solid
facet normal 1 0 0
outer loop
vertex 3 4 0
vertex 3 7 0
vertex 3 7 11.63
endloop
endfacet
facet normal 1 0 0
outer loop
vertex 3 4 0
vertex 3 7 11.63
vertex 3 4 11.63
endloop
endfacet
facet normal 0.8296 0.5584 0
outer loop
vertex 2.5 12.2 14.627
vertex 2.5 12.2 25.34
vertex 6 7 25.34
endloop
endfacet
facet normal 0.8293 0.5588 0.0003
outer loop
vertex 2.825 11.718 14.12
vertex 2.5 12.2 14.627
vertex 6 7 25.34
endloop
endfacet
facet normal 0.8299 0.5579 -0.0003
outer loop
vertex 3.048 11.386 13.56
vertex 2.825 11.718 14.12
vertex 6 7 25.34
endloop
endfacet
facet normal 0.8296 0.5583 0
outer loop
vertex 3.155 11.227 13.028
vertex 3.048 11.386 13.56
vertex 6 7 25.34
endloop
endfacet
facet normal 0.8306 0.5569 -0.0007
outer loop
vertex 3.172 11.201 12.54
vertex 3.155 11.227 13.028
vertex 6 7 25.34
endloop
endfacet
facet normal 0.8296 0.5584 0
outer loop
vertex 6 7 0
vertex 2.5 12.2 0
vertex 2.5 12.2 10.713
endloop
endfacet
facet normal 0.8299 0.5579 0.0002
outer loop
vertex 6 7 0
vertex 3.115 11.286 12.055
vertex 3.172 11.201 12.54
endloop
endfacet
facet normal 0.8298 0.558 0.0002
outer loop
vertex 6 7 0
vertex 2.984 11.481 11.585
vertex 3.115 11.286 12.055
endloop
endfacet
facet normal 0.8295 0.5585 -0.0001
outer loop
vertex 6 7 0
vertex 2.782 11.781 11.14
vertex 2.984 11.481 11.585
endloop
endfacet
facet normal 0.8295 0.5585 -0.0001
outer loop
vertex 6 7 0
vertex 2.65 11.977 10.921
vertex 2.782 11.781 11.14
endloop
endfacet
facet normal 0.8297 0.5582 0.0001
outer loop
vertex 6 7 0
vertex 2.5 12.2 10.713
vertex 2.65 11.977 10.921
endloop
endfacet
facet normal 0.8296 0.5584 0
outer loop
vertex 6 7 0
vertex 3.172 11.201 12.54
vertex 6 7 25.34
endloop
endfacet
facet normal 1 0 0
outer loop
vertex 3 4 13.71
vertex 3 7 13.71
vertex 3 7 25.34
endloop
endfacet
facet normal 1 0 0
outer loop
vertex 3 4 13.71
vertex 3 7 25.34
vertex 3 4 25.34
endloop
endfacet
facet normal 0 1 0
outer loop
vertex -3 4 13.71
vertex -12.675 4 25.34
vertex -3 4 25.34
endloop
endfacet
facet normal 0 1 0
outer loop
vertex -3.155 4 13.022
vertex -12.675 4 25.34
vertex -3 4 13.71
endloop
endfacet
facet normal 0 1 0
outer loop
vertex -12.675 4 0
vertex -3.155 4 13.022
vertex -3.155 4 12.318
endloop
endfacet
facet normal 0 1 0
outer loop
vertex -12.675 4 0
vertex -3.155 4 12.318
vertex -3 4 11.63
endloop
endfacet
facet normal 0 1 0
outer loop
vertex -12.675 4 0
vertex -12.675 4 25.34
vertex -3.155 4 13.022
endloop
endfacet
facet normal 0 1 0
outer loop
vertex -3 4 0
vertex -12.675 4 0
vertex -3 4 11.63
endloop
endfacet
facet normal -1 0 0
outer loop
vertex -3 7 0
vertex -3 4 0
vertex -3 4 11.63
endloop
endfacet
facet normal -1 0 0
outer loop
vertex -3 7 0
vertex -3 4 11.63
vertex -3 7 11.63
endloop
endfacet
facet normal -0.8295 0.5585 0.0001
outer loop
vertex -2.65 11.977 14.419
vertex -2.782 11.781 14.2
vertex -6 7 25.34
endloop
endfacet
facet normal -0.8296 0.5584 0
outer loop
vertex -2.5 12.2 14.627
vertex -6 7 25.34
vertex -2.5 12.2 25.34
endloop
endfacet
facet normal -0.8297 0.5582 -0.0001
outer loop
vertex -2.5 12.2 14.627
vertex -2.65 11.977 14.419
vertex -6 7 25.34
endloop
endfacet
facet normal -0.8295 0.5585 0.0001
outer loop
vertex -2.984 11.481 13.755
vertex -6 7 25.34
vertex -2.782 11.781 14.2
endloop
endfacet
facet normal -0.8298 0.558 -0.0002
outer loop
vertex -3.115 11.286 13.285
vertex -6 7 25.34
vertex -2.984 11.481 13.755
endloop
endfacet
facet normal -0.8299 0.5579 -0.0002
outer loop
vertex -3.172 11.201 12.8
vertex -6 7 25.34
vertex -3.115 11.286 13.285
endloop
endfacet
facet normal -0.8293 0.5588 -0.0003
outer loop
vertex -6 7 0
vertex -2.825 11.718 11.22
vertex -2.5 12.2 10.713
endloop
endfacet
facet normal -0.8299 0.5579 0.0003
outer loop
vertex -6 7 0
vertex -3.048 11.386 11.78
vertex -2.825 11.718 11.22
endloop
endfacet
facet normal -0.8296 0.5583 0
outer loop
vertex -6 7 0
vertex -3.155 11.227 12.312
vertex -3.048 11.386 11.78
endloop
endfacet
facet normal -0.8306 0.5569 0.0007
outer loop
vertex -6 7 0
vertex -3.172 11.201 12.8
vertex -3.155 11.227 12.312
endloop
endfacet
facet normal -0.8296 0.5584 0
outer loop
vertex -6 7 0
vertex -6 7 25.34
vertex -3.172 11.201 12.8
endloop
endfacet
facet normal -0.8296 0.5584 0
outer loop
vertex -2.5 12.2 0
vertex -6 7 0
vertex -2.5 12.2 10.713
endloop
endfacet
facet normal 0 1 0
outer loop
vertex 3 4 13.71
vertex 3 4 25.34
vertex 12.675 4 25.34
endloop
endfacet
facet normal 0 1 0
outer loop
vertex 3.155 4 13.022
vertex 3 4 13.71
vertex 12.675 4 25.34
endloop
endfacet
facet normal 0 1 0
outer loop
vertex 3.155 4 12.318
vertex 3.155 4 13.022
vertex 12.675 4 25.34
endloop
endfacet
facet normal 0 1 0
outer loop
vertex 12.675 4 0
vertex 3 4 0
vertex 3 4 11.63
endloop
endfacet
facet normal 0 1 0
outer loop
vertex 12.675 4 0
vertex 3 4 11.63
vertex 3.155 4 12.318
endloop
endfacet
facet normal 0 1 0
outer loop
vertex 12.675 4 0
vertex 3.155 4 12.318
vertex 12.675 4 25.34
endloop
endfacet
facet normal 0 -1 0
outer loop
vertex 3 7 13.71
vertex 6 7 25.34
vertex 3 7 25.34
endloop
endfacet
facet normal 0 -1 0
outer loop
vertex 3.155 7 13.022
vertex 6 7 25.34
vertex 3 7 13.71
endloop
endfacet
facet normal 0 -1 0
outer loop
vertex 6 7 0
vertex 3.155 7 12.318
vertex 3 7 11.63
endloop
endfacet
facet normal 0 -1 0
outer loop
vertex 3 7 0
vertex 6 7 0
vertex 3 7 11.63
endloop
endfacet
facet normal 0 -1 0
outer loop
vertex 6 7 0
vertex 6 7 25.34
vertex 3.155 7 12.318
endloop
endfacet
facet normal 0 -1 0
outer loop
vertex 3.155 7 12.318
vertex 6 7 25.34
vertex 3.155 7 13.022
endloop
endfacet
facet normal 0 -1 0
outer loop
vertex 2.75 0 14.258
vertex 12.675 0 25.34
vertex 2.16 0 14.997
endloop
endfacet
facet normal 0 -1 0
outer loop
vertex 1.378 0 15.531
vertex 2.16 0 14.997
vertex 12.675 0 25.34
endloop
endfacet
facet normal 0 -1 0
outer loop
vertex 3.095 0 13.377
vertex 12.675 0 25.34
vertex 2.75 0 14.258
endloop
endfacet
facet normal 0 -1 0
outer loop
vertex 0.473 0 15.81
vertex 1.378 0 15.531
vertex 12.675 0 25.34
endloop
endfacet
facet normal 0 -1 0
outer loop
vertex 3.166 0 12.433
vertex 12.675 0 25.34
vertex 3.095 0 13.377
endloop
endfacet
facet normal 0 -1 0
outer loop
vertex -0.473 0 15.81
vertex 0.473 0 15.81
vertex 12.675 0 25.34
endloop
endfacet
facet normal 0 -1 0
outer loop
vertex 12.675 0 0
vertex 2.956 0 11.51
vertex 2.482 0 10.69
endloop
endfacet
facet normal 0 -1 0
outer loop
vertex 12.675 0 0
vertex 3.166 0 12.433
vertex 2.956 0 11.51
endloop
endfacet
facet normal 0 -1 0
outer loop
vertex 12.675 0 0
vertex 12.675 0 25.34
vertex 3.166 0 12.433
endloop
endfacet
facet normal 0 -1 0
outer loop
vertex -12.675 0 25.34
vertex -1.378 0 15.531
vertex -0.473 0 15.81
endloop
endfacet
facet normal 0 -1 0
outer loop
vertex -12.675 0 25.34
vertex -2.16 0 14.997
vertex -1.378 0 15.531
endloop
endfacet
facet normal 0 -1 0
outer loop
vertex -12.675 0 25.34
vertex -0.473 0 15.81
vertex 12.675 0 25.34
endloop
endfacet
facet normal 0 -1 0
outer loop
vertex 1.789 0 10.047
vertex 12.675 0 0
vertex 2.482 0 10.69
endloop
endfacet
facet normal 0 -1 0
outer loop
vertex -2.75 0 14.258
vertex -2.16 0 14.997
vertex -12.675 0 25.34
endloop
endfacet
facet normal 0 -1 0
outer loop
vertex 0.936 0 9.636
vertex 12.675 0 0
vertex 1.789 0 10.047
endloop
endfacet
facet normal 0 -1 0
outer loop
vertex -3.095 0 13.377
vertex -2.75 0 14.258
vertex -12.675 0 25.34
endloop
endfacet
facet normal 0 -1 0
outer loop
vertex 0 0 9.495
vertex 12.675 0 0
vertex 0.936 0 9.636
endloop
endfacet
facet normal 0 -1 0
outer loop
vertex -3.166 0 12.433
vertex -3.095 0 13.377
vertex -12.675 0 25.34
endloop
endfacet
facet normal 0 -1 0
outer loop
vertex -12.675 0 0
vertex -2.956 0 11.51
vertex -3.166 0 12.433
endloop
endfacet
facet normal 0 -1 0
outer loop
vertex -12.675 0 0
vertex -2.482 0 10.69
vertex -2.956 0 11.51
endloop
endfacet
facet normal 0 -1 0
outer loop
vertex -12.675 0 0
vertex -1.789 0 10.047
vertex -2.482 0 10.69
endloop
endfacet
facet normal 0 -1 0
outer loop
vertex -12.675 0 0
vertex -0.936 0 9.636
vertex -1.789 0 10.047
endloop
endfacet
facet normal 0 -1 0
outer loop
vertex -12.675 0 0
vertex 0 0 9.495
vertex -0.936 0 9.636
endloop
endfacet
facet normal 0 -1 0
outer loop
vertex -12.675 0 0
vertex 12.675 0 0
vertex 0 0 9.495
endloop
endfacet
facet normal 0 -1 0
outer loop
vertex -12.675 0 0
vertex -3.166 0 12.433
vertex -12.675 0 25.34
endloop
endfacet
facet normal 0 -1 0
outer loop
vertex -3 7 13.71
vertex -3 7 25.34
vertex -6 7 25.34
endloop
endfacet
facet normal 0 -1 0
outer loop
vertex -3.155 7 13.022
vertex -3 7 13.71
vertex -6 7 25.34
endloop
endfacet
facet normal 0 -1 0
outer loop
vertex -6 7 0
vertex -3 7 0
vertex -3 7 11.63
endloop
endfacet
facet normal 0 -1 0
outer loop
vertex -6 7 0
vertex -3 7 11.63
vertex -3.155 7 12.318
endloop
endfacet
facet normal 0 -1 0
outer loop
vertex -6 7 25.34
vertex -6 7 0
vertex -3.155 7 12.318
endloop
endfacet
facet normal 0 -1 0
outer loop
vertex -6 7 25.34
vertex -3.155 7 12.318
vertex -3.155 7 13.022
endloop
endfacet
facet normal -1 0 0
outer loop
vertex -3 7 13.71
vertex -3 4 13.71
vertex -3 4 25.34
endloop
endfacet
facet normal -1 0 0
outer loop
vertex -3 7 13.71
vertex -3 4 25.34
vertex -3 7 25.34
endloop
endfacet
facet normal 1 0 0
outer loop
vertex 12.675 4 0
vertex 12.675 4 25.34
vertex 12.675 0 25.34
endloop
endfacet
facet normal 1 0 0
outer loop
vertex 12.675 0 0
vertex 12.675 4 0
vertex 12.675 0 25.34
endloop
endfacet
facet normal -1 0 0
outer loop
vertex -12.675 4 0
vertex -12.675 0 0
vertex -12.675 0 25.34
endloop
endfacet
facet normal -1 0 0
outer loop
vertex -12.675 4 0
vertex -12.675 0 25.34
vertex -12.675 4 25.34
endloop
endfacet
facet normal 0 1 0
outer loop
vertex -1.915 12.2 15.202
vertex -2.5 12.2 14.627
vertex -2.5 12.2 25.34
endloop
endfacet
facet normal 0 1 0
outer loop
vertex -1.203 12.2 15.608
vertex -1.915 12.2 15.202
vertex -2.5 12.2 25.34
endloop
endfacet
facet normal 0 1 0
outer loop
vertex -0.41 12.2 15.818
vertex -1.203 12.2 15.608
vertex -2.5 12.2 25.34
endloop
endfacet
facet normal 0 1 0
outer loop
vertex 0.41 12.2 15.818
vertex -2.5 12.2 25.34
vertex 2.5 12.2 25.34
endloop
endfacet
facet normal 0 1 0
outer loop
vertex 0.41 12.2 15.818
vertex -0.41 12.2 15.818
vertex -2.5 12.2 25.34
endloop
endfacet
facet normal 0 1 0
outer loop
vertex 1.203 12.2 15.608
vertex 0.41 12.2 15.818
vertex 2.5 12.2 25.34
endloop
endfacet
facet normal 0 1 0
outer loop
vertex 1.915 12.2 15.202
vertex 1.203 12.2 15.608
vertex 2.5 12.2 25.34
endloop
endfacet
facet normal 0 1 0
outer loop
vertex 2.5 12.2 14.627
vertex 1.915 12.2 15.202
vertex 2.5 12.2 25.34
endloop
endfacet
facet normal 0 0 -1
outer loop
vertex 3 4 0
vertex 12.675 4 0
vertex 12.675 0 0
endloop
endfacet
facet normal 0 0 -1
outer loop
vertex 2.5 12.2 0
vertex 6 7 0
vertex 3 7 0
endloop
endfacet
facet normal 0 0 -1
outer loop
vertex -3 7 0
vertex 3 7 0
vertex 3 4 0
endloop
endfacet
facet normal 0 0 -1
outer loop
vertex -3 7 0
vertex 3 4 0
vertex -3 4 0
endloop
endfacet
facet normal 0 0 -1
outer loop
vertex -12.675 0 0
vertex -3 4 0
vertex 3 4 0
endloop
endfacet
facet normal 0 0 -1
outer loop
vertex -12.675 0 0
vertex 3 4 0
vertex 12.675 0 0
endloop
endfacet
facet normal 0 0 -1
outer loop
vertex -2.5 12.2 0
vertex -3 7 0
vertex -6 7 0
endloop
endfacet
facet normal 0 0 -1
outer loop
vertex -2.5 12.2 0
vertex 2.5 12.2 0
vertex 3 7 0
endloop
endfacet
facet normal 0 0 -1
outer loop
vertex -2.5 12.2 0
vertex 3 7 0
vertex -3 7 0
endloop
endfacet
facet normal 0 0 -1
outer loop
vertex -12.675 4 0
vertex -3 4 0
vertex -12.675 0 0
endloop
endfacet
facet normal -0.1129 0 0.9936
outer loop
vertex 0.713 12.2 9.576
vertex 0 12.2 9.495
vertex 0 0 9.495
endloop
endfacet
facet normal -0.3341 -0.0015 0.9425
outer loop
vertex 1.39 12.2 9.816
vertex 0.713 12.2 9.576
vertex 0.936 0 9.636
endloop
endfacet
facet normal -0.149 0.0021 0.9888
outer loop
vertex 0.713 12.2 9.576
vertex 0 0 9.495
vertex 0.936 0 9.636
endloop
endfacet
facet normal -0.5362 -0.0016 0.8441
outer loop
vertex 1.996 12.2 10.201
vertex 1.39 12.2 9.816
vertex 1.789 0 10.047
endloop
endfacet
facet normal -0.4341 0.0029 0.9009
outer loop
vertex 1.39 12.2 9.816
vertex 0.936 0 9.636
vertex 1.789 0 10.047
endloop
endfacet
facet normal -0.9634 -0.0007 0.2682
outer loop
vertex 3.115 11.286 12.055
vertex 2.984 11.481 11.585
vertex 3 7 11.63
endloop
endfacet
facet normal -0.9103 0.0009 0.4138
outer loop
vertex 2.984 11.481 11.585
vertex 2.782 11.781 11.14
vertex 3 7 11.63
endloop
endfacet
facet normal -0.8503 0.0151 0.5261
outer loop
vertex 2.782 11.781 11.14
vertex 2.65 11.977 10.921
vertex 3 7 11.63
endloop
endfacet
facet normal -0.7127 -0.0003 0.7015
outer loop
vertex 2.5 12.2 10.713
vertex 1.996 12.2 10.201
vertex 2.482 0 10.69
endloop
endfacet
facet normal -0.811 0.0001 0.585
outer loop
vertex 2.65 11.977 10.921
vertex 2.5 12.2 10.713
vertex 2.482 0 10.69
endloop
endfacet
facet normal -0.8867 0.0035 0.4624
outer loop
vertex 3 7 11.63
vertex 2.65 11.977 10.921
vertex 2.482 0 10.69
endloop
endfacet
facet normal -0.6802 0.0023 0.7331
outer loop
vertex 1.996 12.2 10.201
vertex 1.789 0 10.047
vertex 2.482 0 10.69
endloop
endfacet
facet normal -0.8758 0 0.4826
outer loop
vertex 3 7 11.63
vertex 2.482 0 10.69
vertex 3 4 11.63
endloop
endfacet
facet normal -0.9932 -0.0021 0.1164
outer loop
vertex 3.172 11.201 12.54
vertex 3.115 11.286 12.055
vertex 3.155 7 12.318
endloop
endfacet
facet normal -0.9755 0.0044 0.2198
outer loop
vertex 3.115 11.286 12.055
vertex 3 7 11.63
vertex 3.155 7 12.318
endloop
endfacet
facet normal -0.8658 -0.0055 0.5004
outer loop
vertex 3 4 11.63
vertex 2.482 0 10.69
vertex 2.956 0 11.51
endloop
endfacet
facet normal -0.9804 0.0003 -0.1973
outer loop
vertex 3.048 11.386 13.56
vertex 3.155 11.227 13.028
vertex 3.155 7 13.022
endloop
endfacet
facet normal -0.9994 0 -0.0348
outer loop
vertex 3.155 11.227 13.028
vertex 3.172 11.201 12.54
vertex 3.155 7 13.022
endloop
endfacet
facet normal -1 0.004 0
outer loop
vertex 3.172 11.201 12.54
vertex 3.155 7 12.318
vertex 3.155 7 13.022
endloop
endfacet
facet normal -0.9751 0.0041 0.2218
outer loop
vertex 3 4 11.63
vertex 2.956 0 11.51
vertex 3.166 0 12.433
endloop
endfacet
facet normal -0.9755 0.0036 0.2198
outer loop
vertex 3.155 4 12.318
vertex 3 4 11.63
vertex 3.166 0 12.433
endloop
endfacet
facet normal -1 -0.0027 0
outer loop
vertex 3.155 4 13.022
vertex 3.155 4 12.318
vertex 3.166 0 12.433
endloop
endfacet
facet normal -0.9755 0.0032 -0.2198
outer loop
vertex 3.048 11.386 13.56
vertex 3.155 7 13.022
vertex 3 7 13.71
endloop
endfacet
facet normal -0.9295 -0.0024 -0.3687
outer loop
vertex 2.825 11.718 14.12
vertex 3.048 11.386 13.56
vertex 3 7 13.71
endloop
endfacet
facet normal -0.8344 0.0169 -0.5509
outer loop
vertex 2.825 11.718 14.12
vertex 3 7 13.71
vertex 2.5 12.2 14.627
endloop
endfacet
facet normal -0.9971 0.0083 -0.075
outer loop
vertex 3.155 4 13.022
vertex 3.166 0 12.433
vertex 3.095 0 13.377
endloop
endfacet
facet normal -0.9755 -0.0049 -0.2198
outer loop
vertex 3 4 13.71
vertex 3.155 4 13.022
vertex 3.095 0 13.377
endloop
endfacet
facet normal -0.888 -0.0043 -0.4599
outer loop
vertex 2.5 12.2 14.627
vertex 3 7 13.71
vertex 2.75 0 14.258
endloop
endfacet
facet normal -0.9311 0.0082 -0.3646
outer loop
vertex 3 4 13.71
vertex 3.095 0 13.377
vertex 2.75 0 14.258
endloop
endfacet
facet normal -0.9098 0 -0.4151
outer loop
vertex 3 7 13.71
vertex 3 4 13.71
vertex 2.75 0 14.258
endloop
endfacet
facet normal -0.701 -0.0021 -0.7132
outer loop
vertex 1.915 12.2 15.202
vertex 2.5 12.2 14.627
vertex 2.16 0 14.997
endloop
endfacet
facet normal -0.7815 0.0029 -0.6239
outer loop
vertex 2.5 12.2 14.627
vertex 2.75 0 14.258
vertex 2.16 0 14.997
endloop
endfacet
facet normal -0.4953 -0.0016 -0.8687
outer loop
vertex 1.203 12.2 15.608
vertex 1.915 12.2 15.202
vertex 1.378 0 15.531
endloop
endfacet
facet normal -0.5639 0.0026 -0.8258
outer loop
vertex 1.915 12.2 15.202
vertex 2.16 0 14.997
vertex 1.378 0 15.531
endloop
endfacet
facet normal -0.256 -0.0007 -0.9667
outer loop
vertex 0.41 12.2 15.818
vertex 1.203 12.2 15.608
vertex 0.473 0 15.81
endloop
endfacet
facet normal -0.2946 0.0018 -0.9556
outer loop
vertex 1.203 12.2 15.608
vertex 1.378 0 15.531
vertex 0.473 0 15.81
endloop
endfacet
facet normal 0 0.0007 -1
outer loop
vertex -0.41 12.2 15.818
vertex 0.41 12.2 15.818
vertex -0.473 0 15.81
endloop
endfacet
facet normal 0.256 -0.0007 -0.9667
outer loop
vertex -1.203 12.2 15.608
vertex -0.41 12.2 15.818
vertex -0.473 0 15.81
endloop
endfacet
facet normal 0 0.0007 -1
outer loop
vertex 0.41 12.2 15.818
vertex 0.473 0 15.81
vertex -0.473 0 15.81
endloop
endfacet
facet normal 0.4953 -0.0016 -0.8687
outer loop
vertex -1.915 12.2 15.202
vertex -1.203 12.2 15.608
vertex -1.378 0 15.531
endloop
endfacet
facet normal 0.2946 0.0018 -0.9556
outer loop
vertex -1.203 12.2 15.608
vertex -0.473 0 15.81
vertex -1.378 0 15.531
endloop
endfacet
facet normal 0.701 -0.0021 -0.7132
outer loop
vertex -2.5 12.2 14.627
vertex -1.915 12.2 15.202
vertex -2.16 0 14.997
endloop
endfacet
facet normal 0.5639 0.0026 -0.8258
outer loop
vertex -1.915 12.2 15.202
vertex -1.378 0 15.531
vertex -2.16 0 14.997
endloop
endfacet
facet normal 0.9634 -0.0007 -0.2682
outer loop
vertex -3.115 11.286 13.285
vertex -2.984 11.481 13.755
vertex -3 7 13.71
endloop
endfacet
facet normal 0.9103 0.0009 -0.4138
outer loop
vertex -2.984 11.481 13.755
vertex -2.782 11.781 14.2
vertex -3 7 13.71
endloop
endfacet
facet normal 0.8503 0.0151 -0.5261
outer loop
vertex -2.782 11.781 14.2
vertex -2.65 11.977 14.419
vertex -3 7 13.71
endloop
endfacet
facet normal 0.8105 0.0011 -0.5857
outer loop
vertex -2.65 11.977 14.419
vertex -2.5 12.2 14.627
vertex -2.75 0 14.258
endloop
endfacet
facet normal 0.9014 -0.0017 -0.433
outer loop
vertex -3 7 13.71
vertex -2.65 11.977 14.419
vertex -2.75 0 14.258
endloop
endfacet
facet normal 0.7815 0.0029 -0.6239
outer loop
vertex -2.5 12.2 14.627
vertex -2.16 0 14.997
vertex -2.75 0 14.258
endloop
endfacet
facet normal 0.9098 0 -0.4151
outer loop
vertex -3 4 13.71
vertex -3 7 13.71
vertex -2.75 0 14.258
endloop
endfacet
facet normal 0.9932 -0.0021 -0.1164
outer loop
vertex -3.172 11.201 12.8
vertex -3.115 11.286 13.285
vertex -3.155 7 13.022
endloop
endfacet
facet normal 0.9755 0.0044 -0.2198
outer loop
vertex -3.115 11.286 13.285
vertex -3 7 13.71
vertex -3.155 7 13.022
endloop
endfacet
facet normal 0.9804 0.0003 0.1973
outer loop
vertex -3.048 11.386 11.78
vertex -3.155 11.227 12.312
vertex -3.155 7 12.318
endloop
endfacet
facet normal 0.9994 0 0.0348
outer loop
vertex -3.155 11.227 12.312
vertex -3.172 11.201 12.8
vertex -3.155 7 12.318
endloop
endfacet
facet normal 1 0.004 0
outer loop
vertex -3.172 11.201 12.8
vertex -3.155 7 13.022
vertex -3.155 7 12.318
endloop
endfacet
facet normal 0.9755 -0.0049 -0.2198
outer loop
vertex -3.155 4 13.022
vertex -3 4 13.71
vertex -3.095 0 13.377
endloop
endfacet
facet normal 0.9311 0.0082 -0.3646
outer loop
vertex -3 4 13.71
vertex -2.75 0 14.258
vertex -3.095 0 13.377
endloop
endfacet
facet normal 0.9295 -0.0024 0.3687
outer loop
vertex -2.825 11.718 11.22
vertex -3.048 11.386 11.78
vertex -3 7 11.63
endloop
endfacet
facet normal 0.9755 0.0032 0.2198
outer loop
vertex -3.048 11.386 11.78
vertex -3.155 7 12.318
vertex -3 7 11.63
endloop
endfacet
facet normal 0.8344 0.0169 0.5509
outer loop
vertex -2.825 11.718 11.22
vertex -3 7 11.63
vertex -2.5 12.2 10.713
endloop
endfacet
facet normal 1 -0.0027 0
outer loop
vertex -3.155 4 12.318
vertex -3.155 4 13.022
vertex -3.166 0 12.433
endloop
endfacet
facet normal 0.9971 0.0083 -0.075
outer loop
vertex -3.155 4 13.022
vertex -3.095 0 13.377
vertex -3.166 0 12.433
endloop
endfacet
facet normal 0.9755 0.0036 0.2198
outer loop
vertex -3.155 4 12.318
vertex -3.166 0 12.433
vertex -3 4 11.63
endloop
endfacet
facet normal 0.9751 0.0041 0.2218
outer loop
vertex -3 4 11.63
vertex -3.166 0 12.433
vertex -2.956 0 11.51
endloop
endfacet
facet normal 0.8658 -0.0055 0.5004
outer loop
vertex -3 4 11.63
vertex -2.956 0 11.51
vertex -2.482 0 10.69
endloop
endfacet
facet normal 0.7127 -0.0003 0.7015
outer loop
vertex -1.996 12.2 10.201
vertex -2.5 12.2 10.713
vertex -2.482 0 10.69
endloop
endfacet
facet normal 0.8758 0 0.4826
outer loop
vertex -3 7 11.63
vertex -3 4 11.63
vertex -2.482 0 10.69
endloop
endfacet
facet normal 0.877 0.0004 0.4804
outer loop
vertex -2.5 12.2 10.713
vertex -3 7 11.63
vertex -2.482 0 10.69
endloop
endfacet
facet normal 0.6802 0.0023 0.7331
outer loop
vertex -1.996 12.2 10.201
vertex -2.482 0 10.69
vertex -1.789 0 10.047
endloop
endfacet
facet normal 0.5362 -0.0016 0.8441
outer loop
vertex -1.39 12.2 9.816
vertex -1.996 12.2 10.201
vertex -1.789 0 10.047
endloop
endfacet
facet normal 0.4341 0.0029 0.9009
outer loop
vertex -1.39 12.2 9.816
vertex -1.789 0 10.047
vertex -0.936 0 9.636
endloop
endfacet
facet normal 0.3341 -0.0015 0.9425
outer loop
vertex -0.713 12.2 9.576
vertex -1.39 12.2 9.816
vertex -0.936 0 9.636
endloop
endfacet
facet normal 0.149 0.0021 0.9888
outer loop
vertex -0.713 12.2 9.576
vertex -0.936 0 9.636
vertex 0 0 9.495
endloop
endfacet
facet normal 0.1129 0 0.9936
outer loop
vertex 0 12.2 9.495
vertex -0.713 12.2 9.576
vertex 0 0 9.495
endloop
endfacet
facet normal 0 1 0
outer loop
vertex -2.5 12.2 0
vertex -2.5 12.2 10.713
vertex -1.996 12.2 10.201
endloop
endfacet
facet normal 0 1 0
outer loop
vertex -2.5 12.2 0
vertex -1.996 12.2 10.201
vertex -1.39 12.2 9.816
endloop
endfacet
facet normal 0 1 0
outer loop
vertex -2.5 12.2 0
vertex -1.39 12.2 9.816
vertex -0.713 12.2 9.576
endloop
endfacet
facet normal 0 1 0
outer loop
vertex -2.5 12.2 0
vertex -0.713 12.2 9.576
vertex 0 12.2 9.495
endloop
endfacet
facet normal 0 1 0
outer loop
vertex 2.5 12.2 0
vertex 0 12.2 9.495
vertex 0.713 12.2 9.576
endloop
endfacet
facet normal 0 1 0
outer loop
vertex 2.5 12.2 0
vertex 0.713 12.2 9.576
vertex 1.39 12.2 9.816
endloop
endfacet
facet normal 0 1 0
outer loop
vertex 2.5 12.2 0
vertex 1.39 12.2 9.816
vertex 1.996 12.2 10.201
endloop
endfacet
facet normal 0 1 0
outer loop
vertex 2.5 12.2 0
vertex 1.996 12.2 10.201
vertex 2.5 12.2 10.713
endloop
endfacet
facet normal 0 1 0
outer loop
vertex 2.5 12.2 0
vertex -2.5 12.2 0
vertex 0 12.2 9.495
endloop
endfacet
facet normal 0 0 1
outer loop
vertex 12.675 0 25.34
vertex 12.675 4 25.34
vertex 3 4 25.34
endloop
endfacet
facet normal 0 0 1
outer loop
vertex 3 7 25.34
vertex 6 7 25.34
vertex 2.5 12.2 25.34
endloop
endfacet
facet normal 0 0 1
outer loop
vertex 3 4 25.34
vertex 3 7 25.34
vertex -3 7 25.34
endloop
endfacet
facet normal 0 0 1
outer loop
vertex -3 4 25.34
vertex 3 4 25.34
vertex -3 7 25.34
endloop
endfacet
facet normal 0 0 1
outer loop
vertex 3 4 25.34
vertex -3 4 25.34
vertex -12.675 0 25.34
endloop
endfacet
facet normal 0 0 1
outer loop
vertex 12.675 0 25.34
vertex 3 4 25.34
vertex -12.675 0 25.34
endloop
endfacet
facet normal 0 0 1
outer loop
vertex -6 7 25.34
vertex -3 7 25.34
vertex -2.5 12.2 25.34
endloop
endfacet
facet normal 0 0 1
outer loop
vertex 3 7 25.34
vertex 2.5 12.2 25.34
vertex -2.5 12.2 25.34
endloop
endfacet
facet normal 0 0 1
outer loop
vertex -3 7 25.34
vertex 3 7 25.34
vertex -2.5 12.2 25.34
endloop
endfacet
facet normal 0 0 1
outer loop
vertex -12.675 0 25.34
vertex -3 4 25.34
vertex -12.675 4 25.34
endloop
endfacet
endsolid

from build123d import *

# Parameters (mm, degrees)
BOSS_EXTRUDE1_DEPTH = 25.34
SKETCH2_R           = 3.175
CUT_EXTRUDE1_DEPTH  = 31.848196463


with BuildPart() as part:
    # Sketch1 → Boss-Extrude1 (new body)
    with BuildSketch(Plane.XY):
        Polygon((12.675, 0), (-12.675, 0), (-12.675, 4), (-3, 4), (-3, 7), (-6, 7), (-2.5, 12.2), (2.5, 12.2), (6, 7), (3, 7), (3, 4), (12.675, 4), align=None)
    extrude(amount=BOSS_EXTRUDE1_DEPTH)

    # Sketch2 → Cut-Extrude1 (cut, through all)
    with BuildSketch(Plane.XZ):
        with Locations(Location((0, 12.67, 0), (0, 0, 270))):
            Circle(SKETCH2_R)
    extrude(amount=-CUT_EXTRUDE1_DEPTH, mode=Mode.SUBTRACT)


solid = part.part
